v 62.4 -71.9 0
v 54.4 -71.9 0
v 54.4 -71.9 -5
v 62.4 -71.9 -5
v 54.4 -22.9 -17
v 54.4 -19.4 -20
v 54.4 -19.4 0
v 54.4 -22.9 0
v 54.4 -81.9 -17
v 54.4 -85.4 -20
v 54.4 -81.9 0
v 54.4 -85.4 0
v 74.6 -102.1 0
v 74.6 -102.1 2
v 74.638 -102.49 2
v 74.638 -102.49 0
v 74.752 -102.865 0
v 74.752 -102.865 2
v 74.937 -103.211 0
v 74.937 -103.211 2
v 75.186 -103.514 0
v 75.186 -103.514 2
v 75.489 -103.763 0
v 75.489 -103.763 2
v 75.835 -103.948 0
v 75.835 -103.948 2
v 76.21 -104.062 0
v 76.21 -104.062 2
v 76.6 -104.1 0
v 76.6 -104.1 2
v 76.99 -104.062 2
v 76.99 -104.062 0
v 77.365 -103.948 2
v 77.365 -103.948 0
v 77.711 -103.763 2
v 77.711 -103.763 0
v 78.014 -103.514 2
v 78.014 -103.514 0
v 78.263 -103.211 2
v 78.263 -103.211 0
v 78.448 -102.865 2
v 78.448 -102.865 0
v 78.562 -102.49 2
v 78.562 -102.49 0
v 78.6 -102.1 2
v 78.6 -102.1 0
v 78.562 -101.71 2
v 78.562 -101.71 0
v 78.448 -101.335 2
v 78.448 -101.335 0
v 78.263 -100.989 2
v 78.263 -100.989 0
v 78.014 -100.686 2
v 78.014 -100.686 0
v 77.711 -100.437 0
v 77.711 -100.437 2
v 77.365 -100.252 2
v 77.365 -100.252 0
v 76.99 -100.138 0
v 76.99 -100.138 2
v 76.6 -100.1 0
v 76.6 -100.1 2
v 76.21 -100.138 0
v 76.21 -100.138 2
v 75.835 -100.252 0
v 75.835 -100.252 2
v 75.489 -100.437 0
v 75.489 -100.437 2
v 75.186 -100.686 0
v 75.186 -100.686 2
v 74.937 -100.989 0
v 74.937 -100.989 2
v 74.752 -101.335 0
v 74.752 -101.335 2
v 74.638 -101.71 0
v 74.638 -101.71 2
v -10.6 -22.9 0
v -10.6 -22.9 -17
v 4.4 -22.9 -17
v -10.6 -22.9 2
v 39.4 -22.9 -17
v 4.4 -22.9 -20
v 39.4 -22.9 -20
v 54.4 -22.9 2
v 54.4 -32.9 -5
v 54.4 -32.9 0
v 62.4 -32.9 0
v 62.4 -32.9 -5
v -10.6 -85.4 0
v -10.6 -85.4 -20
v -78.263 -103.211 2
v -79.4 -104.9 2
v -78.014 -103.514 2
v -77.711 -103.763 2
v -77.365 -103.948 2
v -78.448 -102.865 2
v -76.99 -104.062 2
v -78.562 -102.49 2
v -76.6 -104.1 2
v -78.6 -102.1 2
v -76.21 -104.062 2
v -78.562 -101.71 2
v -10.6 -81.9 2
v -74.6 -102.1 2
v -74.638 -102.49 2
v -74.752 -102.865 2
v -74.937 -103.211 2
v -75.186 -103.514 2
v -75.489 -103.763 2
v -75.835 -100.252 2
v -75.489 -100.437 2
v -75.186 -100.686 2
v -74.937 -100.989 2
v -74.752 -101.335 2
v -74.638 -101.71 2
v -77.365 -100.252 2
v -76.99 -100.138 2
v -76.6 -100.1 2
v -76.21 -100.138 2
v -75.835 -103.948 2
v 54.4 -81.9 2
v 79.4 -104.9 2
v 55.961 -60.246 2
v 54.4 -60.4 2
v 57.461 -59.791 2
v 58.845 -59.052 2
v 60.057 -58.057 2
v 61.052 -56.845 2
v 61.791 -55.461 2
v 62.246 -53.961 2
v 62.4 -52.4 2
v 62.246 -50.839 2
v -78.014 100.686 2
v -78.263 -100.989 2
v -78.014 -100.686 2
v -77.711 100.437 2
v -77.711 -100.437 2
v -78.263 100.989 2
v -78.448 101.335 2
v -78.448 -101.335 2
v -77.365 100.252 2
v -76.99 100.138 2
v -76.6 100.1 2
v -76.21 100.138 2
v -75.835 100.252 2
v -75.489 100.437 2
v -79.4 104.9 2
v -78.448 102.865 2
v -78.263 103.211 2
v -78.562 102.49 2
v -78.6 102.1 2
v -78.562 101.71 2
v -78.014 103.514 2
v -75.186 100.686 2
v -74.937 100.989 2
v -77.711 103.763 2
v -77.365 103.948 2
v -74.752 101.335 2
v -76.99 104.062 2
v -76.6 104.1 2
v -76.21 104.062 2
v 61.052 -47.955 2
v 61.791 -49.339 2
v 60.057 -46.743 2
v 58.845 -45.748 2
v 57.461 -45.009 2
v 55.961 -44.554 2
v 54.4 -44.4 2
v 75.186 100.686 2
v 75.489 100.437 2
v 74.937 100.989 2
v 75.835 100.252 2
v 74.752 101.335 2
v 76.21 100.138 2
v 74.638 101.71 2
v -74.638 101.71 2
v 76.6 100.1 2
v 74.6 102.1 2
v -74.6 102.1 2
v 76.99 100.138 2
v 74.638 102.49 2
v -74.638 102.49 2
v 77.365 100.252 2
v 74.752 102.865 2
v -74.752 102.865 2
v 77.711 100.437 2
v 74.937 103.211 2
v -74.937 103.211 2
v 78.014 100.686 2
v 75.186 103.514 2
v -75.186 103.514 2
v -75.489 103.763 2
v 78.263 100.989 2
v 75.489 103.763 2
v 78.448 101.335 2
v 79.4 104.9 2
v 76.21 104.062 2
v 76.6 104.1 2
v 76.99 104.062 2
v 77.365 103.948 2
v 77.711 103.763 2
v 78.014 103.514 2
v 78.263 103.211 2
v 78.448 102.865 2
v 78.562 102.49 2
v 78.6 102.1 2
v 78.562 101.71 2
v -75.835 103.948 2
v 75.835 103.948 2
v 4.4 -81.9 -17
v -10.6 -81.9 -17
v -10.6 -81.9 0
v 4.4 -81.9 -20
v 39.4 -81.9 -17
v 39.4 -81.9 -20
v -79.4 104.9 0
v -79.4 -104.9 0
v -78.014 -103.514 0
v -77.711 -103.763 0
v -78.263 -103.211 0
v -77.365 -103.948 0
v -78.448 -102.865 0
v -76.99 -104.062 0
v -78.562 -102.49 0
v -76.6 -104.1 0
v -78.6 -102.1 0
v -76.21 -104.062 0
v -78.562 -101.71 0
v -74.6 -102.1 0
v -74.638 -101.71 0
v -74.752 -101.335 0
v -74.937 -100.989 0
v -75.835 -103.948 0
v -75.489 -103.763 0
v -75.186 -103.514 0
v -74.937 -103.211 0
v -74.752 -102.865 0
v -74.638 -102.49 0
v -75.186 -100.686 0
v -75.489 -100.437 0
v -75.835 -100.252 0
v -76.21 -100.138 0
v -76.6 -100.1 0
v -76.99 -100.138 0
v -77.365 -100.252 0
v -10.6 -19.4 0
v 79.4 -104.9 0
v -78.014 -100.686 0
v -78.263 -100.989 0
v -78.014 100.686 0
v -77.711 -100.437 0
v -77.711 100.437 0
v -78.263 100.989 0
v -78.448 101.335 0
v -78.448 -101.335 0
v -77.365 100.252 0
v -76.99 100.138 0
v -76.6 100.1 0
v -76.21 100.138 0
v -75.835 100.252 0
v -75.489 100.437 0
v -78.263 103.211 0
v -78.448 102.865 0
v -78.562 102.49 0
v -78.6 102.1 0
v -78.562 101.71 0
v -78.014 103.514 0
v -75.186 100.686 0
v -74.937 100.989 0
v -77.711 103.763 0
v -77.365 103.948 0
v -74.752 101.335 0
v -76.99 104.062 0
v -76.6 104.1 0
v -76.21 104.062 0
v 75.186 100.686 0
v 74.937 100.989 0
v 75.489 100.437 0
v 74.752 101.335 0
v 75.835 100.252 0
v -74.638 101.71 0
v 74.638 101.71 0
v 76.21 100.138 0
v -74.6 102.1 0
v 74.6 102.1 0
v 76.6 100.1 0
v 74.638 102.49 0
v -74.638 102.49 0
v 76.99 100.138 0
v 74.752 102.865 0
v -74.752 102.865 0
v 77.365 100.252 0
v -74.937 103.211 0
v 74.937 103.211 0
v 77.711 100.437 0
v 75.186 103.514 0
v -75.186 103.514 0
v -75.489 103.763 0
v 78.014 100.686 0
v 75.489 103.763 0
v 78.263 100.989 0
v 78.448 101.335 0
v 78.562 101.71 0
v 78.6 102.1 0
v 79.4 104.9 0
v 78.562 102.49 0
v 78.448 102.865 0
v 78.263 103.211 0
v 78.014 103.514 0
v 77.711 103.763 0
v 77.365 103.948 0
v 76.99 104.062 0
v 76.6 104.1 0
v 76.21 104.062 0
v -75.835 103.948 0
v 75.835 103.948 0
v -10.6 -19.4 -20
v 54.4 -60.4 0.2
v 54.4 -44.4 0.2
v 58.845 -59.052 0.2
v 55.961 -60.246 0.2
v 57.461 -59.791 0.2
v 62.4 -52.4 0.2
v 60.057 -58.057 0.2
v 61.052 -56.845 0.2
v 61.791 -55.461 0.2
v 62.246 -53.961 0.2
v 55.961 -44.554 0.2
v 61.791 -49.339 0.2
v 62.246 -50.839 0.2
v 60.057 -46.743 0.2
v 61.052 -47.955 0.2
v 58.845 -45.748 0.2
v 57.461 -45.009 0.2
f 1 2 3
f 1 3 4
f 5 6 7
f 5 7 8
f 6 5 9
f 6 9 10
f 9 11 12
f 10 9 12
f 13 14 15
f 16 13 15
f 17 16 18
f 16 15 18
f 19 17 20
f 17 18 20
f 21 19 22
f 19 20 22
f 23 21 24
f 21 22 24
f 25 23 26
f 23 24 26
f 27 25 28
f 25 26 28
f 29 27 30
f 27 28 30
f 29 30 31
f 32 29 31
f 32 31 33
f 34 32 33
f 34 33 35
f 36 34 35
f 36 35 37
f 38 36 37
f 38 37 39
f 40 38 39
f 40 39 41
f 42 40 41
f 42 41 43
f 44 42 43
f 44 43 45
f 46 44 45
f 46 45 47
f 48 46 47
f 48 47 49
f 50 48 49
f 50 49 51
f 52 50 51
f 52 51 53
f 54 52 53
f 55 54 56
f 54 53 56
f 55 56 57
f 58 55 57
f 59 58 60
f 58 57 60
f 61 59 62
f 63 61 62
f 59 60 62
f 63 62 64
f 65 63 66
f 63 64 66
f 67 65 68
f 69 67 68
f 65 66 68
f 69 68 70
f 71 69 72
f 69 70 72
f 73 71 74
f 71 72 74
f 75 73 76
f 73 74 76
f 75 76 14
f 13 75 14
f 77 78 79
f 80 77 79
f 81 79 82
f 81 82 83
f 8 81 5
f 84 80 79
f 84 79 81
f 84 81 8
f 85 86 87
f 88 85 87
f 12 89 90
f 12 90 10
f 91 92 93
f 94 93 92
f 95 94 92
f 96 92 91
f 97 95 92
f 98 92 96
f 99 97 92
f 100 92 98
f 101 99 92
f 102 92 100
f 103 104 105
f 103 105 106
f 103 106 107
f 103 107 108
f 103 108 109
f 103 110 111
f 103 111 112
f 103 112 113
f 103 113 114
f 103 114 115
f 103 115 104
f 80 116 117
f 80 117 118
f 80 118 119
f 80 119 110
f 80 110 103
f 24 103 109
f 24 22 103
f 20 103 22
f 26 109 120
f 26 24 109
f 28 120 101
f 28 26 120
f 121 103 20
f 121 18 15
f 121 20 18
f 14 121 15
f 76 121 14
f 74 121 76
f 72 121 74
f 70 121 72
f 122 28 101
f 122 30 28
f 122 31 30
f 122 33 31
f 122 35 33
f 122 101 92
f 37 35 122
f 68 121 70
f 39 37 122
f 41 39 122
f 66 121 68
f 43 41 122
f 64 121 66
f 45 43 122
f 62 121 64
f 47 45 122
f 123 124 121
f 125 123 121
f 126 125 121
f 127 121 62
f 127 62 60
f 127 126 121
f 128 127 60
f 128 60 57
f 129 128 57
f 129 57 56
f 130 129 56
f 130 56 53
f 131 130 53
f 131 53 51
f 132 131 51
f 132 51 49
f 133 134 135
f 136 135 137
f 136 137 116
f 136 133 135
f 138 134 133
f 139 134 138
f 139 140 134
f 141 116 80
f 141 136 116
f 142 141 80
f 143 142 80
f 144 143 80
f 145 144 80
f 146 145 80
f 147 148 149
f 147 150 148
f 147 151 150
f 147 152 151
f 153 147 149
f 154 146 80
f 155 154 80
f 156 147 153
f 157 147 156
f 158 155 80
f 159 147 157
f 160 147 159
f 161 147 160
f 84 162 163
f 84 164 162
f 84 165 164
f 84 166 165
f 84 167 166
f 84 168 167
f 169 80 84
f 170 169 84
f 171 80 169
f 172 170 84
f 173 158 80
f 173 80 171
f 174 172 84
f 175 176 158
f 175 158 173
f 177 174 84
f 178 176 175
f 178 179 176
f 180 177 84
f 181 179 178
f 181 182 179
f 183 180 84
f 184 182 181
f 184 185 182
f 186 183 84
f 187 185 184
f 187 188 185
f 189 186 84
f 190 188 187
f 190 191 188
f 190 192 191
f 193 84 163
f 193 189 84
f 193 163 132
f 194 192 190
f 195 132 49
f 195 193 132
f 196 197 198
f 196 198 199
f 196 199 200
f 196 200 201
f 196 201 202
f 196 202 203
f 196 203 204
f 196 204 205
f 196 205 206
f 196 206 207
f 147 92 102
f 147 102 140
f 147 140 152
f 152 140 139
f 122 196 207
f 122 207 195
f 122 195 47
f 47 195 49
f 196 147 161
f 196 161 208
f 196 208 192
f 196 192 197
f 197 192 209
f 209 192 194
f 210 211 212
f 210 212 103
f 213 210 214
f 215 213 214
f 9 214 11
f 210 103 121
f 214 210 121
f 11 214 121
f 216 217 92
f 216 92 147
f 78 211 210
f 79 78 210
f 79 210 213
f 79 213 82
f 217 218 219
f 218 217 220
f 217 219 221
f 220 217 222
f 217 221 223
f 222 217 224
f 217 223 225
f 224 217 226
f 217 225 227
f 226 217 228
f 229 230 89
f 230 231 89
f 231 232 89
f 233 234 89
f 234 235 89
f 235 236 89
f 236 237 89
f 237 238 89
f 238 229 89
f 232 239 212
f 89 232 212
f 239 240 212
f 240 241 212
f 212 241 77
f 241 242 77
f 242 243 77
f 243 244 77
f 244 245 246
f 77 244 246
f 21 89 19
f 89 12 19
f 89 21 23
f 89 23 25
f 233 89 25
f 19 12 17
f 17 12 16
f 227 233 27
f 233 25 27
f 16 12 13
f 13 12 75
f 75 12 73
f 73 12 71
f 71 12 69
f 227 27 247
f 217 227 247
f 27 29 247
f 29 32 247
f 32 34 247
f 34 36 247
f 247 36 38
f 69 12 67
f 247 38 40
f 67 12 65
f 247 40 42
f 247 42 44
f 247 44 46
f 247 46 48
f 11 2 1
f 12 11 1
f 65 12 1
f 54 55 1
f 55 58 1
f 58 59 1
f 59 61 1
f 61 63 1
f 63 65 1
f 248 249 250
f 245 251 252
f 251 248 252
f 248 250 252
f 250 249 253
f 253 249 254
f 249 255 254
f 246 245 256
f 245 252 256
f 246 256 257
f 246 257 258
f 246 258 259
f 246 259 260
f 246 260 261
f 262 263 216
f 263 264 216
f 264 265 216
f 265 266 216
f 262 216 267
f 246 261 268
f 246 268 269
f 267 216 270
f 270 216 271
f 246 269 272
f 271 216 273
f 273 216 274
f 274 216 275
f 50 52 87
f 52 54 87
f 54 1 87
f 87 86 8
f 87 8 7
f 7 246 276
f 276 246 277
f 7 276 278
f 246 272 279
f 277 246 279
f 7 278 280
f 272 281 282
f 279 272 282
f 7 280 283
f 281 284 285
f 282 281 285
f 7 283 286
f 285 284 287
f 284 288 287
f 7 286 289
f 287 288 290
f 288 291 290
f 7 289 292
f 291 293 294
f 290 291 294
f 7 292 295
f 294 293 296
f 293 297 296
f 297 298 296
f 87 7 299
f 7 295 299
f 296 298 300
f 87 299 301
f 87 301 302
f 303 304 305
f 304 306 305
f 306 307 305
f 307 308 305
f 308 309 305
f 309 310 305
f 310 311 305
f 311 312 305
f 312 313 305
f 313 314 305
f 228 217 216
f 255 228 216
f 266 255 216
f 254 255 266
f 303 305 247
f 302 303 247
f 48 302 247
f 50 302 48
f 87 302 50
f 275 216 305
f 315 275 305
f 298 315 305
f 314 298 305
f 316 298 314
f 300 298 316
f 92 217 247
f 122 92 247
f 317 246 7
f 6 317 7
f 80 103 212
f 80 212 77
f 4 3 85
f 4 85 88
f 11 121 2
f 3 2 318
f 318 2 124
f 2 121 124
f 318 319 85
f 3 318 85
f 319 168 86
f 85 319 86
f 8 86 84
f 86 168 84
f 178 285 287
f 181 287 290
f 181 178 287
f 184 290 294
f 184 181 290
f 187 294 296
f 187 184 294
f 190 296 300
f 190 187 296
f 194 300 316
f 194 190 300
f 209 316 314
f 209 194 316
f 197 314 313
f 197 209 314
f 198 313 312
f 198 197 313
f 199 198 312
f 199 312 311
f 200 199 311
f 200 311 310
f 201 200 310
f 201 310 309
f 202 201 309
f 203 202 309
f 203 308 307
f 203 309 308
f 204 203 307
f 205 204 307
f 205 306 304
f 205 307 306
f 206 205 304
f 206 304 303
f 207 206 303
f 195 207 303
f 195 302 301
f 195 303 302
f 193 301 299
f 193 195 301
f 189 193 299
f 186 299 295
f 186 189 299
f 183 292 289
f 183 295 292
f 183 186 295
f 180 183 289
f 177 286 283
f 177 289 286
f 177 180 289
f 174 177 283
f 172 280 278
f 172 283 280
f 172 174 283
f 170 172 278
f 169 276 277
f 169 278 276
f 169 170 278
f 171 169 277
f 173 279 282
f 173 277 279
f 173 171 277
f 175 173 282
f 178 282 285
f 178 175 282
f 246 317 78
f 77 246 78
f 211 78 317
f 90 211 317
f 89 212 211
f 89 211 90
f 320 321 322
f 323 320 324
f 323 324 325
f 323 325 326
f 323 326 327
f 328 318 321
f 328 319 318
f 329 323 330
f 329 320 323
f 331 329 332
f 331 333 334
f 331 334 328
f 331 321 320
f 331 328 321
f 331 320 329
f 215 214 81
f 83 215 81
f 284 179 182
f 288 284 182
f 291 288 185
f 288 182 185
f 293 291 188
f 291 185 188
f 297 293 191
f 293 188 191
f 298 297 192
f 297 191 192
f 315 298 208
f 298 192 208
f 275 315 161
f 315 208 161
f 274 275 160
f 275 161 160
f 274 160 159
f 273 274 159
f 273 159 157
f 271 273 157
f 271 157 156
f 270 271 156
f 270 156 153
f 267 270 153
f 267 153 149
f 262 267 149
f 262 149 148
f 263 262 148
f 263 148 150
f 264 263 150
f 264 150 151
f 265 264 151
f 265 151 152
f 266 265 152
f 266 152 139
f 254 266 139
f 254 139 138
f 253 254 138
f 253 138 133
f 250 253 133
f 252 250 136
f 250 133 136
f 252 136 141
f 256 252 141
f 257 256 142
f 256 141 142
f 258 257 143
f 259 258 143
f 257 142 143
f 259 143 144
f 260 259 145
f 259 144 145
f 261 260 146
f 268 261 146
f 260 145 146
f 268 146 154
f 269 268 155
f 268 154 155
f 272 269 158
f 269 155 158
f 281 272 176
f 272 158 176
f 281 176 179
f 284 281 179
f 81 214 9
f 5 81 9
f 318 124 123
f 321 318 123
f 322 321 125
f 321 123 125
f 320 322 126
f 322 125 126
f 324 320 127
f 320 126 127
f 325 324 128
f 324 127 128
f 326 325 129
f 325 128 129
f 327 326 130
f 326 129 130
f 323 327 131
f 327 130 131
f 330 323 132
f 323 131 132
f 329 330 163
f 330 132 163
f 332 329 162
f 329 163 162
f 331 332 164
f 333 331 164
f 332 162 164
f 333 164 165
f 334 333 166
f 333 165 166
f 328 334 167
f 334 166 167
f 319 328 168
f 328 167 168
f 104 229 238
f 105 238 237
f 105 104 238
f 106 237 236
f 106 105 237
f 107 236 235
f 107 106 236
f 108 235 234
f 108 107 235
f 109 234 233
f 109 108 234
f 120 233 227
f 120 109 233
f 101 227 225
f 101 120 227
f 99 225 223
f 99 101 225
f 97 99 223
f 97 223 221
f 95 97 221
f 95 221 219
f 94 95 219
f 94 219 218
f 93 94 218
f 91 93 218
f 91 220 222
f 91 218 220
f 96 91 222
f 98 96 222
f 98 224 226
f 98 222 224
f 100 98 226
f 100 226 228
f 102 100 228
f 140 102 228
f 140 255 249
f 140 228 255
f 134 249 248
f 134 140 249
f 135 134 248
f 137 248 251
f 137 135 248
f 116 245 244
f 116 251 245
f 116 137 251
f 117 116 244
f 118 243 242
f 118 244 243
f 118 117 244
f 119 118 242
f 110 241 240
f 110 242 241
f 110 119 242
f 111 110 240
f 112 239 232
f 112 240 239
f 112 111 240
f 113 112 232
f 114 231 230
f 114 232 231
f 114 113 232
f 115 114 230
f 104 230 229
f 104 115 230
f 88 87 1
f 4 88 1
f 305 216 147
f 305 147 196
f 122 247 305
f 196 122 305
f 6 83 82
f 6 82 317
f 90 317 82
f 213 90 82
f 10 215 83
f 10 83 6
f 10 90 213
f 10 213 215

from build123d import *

# Parameters (mm, degrees)
SKETCH_W                = 158.8
SKETCH_H                = 209.8
PAD_DEPTH               = 2
SKETCH001_R             = 2
POCKET_DEPTH            = 528.261316
SKETCH001_MIRRORED_2_R  = 2
POCKET_MIRRORED_2_DEPTH = 528.261316
SKETCH002_W             = 65
SKETCH002_H             = 59
POCKET001_DEPTH         = 2.001
SKETCH003_W             = 65
SKETCH003_H             = 66
PAD001_DEPTH            = 20
POCKET002_DEPTH         = 1.8
SKETCH005_W             = 15
SKETCH005_H             = 59
POCKET003_DEPTH         = 17
SKETCH006_W             = 35
SKETCH006_H             = 59
POCKET004_DEPTH         = 20.001
SKETCH007_W             = 8
SKETCH007_H             = 39
PAD002_DEPTH            = 5


with BuildPart() as part:
    # Sketch → Pad (new body)
    with BuildSketch(Plane.XY):
        Rectangle(SKETCH_W, SKETCH_H)
    extrude(amount=PAD_DEPTH)

    # Sketch001 (on Face6 of Pad) → Pocket (cut, through all)
    with BuildSketch(Plane.XY.offset(2)):
        with Locations((-76.6, 102.1)):
            Circle(SKETCH001_R)
    pocket = extrude(amount=-POCKET_DEPTH, mode=Mode.SUBTRACT)

    # Sketch001 Mirrored 2 → Pocket Mirrored 2 (cut, through all)
    with BuildSketch(Plane(origin=(0, 0, 2), x_dir=(-1, 0, 0), z_dir=(0, 0, -1))):
        with Locations((-76.6, 102.1)):
            Circle(SKETCH001_MIRRORED_2_R)
    pocket_mirrored_2 = extrude(amount=POCKET_MIRRORED_2_DEPTH, mode=Mode.SUBTRACT)

    # Mirrored001: Pocket, Pocket Mirrored 2 across Sketch001 H_Axis
    add(pocket.mirror(Plane(origin=(0, 0, 2), x_dir=(0, 0, 1), z_dir=(0, 1, 0))), mode=Mode.SUBTRACT)
    add(pocket_mirrored_2.mirror(Plane(origin=(0, 0, 2), x_dir=(0, 0, 1), z_dir=(0, 1, 0))), mode=Mode.SUBTRACT)

    # Sketch002 (on Face5 of MultiTransform) → Pocket001 (cut, through all)
    with BuildSketch(Plane.XY.offset(2)):
        with Locations((21.9, -52.4)):
            Rectangle(SKETCH002_W, SKETCH002_H)
    extrude(amount=-POCKET001_DEPTH, mode=Mode.SUBTRACT)

    # Sketch003 (on Face4 of Pocket001) → Pad001 (join)
    with BuildSketch(Plane(origin=(0, 0, 0), x_dir=(1, 0, 0), z_dir=(0, 0, -1))):
        with Locations((21.9, 52.4)):
            Rectangle(SKETCH003_W, SKETCH003_H)
    extrude(amount=PAD001_DEPTH)

    # Sketch004 (on Face5 of Pad001) → Pocket002 (cut)
    with BuildSketch(Plane.XY.offset(2)):
        with BuildLine():
            ThreePointArc((54.4, -60.4), (62.4, -52.4), (54.4, -44.4))
            Line((54.4, -44.4), (54.4, -60.4))
        make_face()
    extrude(amount=-POCKET002_DEPTH, mode=Mode.SUBTRACT)

    # Sketch005 (on Face21 of Pocket002) → Pocket003 (cut)
    with BuildSketch(Plane.XY):
        with Locations((-3.1, -52.4)):
            Rectangle(SKETCH005_W, SKETCH005_H)
        with Locations((46.9, -52.4)):
            Rectangle(SKETCH005_W, SKETCH005_H)
    extrude(amount=-POCKET003_DEPTH, mode=Mode.SUBTRACT)

    # Sketch006 (on Face28 of Pocket003) → Pocket004 (cut, through all)
    with BuildSketch(Plane.XY):
        with Locations((21.9, -52.4)):
            Rectangle(SKETCH006_W, SKETCH006_H)
    extrude(amount=-POCKET004_DEPTH, mode=Mode.SUBTRACT)

    # Sketch007 (on Face4 of Pocket004) → Pad002 (join)
    with BuildSketch(Plane(origin=(0, 0, 0), x_dir=(1, 0, 0), z_dir=(0, 0, -1))):
        with Locations((58.4, 52.4)):
            Rectangle(SKETCH007_W, SKETCH007_H)
    extrude(amount=PAD002_DEPTH)


solid = part.part
